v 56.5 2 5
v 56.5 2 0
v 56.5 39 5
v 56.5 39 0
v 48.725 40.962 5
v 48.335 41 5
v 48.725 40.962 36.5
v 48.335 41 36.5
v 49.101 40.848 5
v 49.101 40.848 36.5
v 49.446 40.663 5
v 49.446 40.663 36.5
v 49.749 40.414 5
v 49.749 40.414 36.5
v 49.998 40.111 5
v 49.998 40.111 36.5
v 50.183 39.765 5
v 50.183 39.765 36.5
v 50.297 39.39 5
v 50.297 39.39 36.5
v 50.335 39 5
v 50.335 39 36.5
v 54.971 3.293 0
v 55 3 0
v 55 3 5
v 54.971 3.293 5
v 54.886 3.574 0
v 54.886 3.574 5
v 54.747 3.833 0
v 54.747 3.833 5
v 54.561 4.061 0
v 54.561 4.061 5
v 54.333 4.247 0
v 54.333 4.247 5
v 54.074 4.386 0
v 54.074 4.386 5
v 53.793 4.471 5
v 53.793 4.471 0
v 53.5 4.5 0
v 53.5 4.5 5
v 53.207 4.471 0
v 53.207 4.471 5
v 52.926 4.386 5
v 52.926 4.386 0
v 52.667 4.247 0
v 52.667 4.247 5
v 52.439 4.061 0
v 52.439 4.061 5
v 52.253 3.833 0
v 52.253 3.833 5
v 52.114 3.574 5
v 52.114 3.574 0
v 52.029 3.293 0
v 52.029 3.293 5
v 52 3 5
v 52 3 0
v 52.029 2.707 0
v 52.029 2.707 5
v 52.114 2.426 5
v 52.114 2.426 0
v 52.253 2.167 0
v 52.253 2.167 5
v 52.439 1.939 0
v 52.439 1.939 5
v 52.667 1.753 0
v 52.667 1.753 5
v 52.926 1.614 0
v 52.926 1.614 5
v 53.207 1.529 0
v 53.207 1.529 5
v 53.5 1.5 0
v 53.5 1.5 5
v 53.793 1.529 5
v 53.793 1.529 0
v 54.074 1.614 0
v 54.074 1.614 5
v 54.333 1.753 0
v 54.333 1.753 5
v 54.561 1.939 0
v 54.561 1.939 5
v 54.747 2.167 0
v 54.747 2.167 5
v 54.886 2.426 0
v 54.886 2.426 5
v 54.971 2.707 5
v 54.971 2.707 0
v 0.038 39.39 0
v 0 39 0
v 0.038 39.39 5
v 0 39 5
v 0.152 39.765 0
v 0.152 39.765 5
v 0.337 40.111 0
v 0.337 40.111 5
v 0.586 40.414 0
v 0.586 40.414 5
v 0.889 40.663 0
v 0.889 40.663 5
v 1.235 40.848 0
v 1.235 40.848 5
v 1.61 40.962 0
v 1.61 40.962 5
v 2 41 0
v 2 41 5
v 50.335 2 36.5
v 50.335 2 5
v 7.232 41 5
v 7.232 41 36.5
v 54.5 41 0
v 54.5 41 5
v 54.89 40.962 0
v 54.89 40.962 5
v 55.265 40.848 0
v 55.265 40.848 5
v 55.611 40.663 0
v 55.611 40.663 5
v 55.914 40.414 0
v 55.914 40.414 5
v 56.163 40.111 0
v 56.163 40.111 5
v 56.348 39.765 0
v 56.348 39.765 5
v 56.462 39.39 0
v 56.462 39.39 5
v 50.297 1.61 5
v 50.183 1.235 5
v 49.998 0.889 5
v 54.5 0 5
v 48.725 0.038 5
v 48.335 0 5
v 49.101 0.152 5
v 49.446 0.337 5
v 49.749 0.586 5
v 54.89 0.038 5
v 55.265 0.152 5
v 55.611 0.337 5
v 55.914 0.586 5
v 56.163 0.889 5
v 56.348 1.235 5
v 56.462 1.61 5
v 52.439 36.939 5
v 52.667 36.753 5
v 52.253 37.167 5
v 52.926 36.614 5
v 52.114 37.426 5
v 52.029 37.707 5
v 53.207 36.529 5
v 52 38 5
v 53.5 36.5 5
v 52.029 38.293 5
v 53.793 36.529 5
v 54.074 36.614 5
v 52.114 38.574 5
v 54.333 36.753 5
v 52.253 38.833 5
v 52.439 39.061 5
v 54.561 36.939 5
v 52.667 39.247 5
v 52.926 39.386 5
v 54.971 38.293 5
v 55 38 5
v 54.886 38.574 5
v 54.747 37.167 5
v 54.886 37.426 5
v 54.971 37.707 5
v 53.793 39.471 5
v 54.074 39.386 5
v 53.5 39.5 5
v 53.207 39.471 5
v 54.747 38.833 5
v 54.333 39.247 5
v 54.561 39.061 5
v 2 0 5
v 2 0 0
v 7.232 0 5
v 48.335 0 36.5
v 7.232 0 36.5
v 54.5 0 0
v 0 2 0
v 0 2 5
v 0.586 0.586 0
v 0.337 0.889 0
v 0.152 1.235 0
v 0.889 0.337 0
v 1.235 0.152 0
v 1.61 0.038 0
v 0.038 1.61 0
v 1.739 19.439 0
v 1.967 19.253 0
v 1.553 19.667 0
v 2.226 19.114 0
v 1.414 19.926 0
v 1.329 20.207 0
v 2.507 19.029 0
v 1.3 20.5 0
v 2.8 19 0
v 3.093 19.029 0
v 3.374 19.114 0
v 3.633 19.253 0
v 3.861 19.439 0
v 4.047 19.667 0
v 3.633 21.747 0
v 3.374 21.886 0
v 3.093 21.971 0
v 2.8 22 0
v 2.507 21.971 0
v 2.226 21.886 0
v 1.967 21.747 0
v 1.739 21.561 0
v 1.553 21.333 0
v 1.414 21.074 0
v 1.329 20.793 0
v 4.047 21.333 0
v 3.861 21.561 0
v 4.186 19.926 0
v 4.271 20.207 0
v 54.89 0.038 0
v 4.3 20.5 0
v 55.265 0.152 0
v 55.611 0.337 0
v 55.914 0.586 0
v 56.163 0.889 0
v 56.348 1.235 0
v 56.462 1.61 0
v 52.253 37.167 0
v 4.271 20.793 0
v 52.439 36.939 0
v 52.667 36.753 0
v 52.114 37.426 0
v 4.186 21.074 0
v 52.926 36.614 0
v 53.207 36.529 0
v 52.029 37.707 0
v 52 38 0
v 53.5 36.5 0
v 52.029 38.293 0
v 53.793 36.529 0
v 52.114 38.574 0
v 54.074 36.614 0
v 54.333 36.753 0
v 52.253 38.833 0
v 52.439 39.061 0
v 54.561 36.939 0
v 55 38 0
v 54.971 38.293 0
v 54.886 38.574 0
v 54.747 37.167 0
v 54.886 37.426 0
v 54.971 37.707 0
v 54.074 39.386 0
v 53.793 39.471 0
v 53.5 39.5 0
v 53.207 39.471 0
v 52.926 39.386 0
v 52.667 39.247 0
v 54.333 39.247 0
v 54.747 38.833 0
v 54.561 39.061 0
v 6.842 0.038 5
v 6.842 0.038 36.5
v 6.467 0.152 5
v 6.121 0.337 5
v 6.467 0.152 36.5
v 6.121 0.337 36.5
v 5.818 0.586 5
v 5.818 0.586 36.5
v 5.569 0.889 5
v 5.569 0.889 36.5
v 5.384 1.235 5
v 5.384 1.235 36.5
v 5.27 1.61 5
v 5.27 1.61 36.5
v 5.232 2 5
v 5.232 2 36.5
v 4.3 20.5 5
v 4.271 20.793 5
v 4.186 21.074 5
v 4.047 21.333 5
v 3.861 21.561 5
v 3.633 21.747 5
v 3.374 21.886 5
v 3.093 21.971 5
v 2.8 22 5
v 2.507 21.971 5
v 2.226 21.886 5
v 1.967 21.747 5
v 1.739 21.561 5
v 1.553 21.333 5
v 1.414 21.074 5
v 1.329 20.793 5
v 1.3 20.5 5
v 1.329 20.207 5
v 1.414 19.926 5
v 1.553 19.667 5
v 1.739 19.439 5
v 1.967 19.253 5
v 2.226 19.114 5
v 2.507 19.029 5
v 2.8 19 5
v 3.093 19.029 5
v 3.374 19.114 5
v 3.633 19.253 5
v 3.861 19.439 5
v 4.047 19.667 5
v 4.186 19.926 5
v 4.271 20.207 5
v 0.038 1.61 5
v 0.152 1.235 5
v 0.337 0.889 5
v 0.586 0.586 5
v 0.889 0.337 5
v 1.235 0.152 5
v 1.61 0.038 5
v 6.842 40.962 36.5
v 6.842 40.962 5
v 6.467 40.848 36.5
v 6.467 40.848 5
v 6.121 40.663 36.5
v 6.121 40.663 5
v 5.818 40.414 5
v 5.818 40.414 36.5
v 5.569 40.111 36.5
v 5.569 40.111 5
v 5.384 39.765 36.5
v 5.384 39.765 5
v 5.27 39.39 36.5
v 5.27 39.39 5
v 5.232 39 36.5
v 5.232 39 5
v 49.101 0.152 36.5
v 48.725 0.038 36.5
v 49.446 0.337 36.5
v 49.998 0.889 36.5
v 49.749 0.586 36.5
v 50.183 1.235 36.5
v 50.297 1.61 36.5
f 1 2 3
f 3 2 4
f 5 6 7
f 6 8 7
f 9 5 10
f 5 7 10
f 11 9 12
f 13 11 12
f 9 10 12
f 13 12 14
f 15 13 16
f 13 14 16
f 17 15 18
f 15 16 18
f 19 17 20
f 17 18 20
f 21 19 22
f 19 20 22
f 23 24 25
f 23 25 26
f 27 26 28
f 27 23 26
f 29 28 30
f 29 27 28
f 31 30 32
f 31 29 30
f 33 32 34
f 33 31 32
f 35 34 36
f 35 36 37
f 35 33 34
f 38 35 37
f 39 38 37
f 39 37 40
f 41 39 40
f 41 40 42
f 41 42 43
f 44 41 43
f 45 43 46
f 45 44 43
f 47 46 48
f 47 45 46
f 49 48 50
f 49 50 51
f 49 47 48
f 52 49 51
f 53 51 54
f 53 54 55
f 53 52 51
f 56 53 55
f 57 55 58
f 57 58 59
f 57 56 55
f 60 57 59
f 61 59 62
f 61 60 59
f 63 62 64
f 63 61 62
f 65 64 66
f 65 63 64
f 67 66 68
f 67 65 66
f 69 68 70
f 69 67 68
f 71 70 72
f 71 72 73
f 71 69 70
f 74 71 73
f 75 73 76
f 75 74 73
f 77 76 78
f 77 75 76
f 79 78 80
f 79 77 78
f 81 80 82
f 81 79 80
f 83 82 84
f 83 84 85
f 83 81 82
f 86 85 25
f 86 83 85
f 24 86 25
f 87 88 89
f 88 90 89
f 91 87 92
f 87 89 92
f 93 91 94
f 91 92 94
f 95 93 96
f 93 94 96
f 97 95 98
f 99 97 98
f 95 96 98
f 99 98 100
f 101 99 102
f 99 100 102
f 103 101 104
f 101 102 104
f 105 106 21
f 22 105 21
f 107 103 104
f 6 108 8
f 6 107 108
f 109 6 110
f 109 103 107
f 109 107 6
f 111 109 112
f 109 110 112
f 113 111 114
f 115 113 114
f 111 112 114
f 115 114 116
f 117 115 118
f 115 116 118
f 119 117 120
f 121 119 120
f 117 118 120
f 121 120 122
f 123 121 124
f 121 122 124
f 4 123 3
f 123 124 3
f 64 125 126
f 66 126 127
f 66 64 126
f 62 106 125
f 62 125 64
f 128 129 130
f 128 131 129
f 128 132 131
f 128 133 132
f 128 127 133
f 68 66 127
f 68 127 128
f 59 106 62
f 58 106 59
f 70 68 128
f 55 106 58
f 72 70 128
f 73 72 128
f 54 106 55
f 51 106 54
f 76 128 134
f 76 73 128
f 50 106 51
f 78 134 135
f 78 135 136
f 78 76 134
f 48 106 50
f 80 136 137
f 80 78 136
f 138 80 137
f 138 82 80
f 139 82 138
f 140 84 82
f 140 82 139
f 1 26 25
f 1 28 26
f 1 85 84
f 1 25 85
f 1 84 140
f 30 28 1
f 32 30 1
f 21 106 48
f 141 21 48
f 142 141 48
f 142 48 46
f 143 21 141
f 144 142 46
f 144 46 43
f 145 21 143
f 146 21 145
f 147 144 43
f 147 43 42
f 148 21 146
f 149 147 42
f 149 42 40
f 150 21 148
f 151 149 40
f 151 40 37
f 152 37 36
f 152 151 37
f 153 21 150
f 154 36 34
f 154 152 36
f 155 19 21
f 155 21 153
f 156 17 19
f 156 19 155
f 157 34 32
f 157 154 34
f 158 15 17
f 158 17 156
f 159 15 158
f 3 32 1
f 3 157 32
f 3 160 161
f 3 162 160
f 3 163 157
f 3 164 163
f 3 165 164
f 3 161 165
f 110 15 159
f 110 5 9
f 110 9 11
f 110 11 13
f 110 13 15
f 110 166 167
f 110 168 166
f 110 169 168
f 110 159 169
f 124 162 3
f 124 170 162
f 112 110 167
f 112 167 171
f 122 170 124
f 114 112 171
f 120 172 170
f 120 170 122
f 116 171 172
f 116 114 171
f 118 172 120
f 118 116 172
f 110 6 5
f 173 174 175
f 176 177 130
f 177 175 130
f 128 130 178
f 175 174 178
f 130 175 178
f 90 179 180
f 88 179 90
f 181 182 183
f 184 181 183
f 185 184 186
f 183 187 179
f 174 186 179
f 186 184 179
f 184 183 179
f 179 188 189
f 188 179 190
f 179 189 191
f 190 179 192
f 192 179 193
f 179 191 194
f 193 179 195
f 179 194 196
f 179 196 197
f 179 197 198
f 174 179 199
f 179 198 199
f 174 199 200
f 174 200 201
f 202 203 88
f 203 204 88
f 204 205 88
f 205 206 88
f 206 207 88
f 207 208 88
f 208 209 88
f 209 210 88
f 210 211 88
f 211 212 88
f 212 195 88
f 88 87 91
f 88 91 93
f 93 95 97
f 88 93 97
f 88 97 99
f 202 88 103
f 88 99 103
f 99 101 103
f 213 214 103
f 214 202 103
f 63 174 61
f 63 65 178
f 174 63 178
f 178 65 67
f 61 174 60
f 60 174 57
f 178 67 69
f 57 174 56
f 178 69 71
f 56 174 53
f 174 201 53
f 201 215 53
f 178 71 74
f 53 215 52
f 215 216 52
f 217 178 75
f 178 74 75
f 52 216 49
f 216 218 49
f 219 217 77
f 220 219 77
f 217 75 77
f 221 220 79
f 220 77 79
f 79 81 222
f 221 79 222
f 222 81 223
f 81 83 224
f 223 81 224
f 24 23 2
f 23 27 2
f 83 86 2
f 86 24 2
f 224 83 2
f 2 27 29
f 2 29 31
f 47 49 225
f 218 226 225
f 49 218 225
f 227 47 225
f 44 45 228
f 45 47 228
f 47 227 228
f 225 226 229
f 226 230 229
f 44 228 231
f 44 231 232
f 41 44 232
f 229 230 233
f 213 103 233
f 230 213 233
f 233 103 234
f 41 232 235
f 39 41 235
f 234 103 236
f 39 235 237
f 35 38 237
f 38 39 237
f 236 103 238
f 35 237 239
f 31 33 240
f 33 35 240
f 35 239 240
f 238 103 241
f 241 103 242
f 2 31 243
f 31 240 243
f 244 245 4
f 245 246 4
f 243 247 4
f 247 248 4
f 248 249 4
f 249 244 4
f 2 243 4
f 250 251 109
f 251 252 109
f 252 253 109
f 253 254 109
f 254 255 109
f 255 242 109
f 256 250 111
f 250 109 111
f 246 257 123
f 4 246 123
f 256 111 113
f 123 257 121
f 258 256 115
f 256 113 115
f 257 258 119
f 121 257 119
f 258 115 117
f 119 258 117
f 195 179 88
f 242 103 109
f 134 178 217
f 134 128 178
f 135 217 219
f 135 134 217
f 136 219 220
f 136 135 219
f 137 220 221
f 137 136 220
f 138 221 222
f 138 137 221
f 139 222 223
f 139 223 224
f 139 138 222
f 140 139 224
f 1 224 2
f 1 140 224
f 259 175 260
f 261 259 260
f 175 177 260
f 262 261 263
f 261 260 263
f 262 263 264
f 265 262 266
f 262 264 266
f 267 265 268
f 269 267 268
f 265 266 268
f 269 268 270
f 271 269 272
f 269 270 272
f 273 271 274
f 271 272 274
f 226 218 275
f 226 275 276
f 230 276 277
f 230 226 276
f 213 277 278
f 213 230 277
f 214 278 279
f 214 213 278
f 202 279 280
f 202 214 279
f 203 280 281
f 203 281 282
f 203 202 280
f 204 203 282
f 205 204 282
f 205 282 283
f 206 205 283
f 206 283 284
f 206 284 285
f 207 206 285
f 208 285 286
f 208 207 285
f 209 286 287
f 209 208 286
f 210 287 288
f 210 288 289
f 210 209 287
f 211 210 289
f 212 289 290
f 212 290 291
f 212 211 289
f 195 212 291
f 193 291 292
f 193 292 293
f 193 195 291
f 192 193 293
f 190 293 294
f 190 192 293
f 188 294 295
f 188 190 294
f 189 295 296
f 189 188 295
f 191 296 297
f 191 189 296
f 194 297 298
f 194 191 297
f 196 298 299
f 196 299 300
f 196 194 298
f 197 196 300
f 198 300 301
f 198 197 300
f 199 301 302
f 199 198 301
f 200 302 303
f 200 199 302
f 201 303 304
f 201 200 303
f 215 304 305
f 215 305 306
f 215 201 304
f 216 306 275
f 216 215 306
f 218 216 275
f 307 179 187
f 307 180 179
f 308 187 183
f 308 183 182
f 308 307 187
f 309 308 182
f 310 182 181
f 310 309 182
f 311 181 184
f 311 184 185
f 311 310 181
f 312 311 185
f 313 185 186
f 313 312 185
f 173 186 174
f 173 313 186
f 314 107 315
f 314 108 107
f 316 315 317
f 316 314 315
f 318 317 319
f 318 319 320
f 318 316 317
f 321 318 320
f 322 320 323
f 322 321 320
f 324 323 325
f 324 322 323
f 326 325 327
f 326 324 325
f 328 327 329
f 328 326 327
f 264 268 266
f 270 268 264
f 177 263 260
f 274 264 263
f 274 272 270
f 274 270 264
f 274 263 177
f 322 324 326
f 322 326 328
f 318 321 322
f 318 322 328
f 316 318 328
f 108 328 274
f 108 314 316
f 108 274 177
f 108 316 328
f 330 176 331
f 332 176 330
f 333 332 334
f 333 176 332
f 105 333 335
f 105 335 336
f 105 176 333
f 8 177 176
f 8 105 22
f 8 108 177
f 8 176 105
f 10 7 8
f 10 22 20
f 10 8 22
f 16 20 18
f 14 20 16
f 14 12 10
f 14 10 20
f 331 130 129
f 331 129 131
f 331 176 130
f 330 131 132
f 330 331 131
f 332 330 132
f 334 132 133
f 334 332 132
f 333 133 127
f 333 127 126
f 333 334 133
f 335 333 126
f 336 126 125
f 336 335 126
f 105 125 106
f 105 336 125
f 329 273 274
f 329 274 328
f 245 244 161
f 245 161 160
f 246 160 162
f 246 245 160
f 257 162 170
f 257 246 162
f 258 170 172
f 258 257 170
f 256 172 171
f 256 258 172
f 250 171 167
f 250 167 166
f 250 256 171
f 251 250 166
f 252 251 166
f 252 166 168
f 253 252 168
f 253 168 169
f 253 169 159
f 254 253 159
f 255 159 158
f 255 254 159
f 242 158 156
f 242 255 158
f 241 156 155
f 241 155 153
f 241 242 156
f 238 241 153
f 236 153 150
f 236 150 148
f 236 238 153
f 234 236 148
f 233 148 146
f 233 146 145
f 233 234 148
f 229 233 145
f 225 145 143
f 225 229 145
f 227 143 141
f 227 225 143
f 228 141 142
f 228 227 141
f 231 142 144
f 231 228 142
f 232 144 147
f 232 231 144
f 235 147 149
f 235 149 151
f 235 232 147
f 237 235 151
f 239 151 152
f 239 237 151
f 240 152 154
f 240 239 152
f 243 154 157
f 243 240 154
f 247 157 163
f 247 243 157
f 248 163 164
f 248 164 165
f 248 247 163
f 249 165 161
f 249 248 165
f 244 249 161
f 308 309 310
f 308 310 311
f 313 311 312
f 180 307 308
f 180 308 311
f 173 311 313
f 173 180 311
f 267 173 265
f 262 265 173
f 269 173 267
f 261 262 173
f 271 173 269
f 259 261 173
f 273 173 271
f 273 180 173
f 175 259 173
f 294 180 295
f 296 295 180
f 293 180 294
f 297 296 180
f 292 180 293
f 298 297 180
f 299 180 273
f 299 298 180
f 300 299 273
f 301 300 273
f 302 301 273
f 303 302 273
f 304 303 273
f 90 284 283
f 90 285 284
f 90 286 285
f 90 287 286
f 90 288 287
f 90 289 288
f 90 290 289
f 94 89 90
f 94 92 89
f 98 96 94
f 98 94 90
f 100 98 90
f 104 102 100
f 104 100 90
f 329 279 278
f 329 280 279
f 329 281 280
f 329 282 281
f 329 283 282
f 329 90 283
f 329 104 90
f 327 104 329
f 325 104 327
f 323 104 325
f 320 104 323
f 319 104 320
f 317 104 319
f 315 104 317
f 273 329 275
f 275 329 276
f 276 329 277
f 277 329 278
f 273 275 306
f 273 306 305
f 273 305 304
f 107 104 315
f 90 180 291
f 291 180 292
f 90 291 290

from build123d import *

# Parameters (mm, degrees)
SKETCH_1_W      = 56.5
SKETCH_1_H      = 41
SKETCH_1_R      = 1.5
EXTRUDE_1_DEPTH = 5
FILLET_1_R      = 2
SKETCH_2_W      = 45.103373127
SKETCH_2_H      = 41
EXTRUDE_2_DEPTH = 31.5
FILLET_2_R      = 2


with BuildPart() as part:
    # 草图1 → 凸台-拉伸1 (new body)
    with BuildSketch(Plane.XY):
        with Locations((28.25, 20.5)):
            Rectangle(SKETCH_1_W, SKETCH_1_H)
        with Locations((2.8, 20.5)):
            Circle(SKETCH_1_R, mode=Mode.SUBTRACT)
        with Locations((53.5, 38)):
            Circle(SKETCH_1_R, mode=Mode.SUBTRACT)
        with Locations((53.5, 3)):
            Circle(SKETCH_1_R, mode=Mode.SUBTRACT)
    extrude(amount=EXTRUDE_1_DEPTH)

    # 圆角1
    fillet_1_edges = [part.edges().sort_by_distance(p)[0] for p in [
        (0, 41, 2.5),
        (56.5, 41, 2.5),
        (56.5, 0, 2.5),
        (0, 0, 2.5),
    ]]
    fillet(fillet_1_edges, radius=FILLET_1_R)

    # 草图2 → 凸台-拉伸2 (add)
    with BuildSketch(Plane.XY.offset(5)):
        with Locations((27.783569507, 20.5)):
            Rectangle(SKETCH_2_W, SKETCH_2_H)
    extrude(amount=EXTRUDE_2_DEPTH)

    # 圆角2
    fillet_2_edges = [part.edges().sort_by_distance(p)[0] for p in [
        (50.33525607, 0, 20.75),
        (50.33525607, 41, 20.75),
        (5.231882943, 41, 20.75),
        (5.231882943, 0, 20.75),
    ]]
    fillet(fillet_2_edges, radius=FILLET_2_R)


solid = part.part
